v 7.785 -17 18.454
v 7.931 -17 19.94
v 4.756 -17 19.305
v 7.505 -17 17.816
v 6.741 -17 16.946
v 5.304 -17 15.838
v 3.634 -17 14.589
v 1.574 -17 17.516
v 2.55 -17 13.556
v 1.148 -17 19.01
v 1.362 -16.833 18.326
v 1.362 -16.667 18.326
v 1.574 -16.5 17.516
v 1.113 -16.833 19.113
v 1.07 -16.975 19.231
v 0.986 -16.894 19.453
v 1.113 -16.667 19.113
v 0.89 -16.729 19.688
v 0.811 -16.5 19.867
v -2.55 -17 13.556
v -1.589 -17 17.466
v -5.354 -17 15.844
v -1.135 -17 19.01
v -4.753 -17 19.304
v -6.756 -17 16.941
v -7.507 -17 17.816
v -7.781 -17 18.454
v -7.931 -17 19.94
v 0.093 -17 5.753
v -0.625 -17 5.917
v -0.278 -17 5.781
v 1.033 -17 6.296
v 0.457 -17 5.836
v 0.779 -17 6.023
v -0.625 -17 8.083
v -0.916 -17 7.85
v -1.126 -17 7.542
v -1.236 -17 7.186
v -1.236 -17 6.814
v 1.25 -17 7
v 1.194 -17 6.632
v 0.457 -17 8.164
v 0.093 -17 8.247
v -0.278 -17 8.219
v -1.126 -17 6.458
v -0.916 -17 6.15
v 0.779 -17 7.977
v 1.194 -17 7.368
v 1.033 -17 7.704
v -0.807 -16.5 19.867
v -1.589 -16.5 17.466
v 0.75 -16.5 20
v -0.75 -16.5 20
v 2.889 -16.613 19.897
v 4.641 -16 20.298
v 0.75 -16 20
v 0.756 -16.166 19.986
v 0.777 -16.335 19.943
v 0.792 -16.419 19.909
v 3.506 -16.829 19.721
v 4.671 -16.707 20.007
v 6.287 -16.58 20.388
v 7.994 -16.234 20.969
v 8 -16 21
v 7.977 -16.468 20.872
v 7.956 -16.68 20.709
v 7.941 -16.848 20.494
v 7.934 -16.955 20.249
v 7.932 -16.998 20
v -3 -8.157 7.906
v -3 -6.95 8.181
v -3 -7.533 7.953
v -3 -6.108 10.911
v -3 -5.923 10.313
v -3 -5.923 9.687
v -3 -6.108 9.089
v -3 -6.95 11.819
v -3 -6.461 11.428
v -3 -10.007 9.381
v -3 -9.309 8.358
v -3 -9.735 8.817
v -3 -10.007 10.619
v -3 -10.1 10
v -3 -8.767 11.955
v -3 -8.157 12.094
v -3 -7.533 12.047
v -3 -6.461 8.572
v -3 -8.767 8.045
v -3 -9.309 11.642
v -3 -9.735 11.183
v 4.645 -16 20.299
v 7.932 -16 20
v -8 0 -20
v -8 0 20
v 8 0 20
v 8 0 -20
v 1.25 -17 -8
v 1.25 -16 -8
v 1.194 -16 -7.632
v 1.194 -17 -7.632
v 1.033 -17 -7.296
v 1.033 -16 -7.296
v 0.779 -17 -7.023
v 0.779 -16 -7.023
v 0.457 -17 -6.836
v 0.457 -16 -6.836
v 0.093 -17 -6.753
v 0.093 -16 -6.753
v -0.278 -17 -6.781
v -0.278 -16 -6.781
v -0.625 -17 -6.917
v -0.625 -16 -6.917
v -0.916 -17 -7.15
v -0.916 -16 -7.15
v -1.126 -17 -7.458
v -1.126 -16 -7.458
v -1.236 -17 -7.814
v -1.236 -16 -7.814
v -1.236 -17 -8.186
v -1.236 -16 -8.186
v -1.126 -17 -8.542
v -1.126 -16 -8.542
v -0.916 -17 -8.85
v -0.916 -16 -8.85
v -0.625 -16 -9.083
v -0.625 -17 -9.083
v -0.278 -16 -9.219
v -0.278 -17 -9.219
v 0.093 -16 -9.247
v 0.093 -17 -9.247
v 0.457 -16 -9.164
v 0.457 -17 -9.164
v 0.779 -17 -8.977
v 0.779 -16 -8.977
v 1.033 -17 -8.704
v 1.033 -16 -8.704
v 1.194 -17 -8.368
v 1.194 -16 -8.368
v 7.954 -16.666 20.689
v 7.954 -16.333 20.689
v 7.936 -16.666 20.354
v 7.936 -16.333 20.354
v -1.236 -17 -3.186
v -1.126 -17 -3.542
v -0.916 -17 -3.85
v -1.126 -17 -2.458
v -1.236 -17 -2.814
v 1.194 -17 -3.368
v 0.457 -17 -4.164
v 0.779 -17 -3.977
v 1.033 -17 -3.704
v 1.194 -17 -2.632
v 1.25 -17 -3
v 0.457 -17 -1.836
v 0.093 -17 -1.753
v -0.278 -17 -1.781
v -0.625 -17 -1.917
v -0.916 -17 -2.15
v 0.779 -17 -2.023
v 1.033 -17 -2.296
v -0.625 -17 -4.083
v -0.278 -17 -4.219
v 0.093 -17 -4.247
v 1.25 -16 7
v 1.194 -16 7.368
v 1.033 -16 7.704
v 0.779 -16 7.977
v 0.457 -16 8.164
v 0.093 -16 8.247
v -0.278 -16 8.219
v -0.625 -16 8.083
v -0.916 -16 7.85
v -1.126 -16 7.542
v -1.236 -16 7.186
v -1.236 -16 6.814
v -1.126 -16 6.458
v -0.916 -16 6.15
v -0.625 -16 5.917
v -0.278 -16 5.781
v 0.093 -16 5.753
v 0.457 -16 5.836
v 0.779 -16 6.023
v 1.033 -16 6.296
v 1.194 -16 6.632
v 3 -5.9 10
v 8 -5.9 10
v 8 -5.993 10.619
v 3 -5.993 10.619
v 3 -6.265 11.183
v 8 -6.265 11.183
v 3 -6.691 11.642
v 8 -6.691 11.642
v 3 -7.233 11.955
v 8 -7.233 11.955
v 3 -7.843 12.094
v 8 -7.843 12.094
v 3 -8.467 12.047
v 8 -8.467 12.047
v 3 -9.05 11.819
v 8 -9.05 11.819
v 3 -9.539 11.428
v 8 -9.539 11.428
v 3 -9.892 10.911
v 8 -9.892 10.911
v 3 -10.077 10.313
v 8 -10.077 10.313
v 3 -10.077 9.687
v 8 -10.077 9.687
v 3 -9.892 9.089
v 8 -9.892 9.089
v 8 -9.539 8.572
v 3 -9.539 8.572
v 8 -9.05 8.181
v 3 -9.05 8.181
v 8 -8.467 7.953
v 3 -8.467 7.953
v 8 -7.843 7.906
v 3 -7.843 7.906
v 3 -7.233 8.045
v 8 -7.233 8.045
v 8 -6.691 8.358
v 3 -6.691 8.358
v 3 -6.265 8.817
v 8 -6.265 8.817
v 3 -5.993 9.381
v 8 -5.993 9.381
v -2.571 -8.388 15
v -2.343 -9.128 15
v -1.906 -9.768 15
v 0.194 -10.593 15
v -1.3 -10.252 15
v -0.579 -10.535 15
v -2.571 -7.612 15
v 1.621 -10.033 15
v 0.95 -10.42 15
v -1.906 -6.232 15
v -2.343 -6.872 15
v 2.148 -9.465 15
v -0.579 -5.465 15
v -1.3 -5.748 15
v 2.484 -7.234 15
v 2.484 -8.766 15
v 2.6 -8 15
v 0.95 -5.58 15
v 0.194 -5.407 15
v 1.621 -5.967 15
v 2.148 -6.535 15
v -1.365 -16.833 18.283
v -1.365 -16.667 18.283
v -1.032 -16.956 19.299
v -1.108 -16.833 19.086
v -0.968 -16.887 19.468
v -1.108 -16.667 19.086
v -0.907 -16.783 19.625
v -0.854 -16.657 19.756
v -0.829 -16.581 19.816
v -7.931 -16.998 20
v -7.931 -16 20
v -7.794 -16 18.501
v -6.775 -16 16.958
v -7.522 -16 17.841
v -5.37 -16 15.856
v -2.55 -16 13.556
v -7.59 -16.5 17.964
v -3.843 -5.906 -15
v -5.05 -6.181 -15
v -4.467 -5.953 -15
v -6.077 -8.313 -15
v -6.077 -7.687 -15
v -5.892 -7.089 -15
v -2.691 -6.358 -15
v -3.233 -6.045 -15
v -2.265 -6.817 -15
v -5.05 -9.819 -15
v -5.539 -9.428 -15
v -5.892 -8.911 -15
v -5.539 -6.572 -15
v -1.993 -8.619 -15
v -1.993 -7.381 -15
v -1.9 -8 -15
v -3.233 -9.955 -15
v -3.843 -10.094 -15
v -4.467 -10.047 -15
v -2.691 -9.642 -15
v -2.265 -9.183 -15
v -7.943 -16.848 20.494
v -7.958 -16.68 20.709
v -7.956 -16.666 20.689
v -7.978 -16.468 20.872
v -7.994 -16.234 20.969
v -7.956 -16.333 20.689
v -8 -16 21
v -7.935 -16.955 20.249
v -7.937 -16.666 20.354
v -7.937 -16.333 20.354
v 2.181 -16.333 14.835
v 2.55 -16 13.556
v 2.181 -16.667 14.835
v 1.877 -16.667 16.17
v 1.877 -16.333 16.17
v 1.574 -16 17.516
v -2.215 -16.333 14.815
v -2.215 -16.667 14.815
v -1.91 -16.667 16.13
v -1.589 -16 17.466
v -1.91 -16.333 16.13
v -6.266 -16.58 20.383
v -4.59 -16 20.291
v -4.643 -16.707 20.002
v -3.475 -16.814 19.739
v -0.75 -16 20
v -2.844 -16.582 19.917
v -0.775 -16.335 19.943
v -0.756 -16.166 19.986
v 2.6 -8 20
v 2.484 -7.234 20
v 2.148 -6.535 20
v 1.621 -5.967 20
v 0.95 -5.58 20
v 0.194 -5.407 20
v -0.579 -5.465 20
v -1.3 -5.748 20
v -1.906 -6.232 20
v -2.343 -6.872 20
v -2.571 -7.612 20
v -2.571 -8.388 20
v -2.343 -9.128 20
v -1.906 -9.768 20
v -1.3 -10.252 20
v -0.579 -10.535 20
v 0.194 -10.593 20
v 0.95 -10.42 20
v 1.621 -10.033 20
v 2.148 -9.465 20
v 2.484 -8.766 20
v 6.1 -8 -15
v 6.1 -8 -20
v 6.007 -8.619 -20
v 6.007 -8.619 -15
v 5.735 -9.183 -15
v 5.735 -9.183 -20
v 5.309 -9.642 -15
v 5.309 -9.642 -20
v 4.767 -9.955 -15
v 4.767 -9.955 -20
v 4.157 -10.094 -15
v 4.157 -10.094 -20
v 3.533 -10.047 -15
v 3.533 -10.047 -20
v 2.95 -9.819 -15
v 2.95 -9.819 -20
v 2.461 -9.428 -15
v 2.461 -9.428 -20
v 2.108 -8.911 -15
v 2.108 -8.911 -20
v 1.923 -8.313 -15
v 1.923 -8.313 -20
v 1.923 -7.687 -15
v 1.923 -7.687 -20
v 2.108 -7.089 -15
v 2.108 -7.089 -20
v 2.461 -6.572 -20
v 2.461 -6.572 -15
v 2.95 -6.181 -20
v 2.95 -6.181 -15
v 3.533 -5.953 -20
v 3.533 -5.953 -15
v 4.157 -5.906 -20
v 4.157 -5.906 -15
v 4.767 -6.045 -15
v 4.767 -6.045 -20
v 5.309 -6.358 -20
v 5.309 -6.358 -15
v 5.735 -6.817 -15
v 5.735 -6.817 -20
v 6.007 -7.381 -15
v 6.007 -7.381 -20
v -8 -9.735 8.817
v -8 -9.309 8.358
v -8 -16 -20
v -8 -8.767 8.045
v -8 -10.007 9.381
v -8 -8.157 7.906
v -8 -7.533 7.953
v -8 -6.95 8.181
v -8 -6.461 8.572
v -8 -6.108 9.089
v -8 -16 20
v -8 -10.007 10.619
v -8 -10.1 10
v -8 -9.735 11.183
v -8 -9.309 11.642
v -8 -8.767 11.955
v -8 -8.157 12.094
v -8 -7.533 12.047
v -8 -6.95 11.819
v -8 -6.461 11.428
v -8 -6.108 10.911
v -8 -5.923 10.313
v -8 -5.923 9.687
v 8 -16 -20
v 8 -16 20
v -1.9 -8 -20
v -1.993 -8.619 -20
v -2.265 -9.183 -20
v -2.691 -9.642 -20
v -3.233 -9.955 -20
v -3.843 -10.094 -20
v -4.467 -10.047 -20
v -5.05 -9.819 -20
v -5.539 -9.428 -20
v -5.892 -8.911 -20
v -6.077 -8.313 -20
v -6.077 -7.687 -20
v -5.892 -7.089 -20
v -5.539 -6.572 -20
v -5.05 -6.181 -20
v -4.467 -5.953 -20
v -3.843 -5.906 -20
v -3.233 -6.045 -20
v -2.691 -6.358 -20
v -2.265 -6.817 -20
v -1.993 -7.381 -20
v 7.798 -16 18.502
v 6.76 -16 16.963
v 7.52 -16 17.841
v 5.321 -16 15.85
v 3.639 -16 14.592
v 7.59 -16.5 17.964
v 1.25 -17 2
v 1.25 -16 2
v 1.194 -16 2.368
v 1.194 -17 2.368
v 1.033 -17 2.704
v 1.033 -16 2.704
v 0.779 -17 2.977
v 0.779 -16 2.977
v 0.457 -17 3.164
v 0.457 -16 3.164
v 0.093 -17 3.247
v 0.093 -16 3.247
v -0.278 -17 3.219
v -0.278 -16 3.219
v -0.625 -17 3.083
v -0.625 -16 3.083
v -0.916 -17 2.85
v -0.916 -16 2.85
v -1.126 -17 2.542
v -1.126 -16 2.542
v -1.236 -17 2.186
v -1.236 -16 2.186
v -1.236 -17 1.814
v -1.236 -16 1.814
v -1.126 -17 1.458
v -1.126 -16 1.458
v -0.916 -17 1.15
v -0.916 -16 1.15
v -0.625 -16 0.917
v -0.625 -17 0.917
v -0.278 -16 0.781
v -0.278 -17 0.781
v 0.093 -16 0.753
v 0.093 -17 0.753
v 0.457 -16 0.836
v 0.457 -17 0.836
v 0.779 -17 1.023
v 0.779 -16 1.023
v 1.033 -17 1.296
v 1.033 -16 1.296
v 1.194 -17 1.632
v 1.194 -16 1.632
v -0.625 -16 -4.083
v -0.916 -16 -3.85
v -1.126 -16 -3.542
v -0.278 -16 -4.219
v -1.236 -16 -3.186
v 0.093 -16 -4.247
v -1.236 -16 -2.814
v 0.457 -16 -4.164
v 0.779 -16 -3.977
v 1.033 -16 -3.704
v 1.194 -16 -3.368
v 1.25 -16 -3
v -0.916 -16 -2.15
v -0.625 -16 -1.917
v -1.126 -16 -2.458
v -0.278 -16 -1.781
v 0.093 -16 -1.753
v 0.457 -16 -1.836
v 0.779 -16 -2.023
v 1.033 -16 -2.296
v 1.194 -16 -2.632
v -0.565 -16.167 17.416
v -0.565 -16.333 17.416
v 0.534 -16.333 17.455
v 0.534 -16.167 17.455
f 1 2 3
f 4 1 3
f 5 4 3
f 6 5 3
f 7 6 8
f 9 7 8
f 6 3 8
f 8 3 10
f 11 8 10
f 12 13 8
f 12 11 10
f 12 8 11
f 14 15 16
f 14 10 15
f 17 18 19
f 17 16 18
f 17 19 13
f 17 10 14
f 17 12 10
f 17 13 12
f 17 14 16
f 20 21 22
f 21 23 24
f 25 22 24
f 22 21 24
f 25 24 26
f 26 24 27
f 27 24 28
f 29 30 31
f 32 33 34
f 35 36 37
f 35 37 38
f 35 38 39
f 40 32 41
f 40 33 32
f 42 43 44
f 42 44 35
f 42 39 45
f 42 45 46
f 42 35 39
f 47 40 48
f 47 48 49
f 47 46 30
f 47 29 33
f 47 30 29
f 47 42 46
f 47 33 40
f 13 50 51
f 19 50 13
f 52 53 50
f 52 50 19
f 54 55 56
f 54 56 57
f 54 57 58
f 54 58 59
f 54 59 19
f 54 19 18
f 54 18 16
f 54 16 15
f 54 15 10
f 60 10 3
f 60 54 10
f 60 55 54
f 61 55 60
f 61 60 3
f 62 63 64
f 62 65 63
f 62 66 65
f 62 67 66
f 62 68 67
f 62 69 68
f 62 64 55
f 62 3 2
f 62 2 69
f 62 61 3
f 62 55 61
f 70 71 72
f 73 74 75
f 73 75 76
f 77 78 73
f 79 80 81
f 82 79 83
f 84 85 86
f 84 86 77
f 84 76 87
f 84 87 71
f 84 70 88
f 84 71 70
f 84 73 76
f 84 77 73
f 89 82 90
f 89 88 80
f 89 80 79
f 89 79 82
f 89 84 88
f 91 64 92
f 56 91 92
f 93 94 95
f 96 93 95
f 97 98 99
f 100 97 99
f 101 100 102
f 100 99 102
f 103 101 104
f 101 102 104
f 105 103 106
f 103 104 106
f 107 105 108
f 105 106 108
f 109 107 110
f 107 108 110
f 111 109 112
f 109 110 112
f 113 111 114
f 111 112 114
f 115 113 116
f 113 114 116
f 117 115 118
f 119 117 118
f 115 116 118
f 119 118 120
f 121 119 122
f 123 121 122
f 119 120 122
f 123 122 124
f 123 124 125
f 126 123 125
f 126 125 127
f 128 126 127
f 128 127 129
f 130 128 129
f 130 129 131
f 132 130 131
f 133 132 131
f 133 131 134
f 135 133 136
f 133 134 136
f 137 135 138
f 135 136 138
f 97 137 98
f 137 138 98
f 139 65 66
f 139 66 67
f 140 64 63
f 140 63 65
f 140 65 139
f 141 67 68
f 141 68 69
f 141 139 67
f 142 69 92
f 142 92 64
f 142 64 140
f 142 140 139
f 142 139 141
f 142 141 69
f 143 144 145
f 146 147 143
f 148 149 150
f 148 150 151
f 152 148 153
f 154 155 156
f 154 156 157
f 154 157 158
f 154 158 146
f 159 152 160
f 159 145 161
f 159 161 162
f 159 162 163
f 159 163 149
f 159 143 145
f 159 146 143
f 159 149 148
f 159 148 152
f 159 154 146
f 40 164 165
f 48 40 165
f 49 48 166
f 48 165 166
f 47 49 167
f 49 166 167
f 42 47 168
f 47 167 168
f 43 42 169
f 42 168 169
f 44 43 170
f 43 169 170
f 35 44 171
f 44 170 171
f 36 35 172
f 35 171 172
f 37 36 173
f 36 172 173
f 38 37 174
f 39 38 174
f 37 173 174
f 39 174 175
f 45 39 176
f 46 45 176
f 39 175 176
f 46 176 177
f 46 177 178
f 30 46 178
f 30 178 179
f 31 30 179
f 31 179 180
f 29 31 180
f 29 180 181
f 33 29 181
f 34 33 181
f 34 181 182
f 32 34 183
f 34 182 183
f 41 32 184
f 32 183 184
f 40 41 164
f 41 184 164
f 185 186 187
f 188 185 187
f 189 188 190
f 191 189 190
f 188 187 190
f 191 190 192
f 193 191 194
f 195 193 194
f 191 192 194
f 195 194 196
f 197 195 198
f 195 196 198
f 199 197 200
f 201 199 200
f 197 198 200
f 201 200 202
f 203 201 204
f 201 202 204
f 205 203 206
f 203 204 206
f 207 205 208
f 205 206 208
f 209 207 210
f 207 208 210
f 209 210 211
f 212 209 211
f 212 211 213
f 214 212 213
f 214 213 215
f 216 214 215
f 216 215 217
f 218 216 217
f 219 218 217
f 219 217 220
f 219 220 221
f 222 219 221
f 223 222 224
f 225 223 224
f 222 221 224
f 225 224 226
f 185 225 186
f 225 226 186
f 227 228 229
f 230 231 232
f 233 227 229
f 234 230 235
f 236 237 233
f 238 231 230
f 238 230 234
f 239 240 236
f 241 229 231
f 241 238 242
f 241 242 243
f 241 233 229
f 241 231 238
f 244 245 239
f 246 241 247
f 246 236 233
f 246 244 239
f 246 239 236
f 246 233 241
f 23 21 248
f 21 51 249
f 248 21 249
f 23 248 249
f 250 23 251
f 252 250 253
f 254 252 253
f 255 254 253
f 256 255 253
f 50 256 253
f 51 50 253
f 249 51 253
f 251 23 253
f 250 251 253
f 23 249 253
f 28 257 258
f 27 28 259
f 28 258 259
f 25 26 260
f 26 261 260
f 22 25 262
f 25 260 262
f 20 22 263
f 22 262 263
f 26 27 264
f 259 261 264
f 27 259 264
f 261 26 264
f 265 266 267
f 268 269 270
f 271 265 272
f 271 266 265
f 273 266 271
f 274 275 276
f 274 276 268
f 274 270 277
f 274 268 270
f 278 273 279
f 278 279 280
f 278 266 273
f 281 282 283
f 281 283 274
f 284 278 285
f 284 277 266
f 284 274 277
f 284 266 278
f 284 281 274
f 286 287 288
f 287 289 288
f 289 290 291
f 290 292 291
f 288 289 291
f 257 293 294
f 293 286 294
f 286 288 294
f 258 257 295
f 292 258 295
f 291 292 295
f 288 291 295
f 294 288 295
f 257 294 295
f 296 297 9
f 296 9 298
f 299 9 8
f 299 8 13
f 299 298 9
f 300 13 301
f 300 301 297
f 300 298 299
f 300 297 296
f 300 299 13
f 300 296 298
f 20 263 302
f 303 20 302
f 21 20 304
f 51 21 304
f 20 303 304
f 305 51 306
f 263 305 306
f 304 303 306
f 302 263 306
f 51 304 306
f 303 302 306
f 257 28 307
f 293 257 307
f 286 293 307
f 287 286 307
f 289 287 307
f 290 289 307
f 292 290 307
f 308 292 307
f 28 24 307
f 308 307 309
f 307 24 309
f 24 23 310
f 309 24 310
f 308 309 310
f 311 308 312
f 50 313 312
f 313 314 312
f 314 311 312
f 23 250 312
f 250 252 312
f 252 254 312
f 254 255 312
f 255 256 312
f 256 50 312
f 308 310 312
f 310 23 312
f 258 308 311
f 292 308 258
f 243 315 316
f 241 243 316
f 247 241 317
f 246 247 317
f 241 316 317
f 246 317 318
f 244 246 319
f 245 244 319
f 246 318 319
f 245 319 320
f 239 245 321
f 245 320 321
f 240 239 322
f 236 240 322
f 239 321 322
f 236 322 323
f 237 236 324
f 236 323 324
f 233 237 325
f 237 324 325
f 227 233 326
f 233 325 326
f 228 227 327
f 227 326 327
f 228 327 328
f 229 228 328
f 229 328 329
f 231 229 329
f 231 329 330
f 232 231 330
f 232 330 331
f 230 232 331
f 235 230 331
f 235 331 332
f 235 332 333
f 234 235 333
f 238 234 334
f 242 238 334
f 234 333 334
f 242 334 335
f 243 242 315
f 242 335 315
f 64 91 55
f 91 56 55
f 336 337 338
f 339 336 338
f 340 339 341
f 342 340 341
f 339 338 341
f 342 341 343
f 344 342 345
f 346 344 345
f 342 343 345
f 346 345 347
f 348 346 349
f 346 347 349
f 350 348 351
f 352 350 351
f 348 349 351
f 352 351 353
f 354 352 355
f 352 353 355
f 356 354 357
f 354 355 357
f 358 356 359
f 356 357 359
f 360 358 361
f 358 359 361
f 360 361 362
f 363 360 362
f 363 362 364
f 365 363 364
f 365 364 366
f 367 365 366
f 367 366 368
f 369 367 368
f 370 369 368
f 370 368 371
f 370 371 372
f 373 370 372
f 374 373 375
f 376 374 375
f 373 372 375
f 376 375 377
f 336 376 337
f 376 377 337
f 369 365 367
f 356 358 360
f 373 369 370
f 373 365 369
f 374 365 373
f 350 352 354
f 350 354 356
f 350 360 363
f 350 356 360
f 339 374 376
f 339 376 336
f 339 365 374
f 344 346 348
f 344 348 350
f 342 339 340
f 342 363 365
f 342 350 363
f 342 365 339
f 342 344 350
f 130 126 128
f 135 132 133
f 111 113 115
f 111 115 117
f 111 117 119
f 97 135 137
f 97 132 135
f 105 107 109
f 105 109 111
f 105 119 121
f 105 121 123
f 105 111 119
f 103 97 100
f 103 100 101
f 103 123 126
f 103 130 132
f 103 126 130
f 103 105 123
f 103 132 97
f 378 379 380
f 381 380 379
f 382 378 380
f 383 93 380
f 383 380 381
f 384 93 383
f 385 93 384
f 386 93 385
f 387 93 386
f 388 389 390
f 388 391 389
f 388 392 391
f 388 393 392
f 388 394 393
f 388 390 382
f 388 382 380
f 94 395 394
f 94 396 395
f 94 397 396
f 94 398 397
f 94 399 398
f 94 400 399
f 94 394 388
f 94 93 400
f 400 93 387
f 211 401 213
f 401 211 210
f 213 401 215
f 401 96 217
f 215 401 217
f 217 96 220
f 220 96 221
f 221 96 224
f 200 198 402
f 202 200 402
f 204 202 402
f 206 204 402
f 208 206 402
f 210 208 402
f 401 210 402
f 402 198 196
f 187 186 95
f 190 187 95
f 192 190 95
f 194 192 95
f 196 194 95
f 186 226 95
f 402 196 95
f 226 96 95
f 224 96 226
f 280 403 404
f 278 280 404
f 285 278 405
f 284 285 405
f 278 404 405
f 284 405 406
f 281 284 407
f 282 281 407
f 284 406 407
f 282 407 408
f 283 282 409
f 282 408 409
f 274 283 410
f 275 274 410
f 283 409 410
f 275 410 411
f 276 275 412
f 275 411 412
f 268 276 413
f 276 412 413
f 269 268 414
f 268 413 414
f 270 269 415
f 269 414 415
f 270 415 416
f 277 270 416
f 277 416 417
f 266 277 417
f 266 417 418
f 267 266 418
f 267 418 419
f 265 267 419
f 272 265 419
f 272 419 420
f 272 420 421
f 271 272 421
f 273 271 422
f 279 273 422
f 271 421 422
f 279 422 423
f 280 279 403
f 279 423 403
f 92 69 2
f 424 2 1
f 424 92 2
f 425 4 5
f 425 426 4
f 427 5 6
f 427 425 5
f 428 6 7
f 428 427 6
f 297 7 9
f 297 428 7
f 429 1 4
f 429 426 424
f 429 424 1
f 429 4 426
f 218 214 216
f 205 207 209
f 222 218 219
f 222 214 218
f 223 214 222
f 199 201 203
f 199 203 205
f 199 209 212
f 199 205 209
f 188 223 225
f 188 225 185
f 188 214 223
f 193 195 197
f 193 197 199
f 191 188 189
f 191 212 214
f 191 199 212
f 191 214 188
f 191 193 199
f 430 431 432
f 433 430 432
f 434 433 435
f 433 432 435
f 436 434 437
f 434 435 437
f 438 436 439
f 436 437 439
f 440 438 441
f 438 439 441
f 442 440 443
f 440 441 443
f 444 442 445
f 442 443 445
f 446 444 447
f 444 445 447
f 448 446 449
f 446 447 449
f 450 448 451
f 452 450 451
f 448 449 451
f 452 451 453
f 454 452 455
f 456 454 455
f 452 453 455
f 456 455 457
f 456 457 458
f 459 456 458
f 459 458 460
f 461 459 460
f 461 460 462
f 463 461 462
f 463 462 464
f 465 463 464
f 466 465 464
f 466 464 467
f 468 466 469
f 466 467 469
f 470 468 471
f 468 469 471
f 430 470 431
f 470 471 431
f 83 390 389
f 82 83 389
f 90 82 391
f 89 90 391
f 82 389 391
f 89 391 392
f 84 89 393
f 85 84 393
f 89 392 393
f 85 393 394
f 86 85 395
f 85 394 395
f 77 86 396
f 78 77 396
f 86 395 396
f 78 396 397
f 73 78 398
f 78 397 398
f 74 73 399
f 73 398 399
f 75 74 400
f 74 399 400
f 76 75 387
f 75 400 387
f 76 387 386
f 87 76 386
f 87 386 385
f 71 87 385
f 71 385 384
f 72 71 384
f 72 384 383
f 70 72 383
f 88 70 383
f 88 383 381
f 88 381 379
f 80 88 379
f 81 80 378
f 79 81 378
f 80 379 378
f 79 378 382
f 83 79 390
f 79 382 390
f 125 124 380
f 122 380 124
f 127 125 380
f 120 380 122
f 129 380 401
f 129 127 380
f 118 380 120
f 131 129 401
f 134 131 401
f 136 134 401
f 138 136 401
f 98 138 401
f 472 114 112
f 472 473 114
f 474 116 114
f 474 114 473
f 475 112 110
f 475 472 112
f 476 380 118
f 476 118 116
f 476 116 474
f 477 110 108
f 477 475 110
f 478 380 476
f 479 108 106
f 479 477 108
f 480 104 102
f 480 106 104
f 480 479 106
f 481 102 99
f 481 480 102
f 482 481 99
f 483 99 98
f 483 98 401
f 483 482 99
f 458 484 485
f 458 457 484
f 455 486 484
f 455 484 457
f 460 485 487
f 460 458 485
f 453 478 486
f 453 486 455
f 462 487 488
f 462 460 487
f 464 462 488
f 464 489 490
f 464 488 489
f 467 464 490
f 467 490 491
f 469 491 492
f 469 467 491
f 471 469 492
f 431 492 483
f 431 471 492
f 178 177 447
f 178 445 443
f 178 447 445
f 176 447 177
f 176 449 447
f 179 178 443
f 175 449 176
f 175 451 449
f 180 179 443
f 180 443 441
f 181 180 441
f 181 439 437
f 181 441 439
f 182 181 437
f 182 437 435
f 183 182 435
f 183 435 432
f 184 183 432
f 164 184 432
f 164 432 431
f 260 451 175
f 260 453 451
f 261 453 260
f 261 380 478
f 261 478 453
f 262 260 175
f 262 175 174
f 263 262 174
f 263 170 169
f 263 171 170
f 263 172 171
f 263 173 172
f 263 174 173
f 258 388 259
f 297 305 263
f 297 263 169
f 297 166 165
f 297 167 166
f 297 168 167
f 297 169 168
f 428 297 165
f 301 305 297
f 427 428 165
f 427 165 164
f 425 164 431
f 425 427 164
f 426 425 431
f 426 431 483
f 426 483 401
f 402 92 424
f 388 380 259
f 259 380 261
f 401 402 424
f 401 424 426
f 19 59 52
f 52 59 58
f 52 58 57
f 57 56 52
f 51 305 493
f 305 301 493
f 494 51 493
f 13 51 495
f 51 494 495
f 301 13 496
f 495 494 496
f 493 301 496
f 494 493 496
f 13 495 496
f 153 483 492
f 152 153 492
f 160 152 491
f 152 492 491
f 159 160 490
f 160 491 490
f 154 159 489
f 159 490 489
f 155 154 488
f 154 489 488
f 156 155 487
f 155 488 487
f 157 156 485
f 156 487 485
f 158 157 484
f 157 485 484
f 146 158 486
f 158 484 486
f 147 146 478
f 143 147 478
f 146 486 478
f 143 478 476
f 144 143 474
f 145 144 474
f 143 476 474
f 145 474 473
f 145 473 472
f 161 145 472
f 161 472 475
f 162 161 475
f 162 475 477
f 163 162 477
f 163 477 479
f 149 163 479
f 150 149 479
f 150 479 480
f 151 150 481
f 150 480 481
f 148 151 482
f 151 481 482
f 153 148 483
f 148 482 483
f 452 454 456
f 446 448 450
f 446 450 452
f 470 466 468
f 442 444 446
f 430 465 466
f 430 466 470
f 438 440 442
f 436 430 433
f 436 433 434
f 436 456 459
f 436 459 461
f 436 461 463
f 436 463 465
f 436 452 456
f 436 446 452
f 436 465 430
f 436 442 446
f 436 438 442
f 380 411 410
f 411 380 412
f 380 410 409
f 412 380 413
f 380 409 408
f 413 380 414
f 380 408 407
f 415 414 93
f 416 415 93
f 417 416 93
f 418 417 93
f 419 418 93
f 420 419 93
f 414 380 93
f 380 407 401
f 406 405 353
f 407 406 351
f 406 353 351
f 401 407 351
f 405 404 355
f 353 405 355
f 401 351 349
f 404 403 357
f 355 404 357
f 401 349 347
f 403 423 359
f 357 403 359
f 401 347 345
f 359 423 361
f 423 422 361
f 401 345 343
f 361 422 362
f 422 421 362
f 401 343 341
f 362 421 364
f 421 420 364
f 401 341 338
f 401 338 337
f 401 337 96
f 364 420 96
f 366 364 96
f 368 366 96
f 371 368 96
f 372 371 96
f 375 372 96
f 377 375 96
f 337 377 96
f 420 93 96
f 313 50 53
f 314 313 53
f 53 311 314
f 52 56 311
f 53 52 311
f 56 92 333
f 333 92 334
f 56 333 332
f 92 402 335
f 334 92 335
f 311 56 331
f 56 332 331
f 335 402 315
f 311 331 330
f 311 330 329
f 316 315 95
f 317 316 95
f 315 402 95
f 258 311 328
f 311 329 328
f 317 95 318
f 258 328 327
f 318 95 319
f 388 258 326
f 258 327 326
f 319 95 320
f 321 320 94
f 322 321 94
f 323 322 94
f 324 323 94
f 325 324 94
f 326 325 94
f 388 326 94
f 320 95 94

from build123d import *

# Parameters (mm, degrees)
F0_W      = 16
F0_H      = 40
F1_DEPTH  = 16
F2_R      = 2.6
F3_DEPTH  = 5
F4_R      = 2.1
F5_DEPTH  = 5
F6_R      = 2.1
F7_DEPTH  = 5
F8_R      = 2.1
F9_DEPTH  = 5
F10_R     = 2.1
F11_DEPTH = 5
F12_R     = 1.25
F13_DEPTH = 1
F14_R     = 1.25
F15_DEPTH = 1
F16_R     = 1.25
F17_DEPTH = 1
F18_R     = 1.25
F19_DEPTH = 1
F21_DEPTH = 1
F22_R     = 0.9999
F23_DEPTH = 0.5


# Not quite as in the source:
# - a fillet or chamfer is up to 0.001 mm smaller than in the source, because OpenCascade refuses the exact size


with BuildPart() as f1:
    # F0 (on Front) → F1 (new body)
    with BuildSketch(Plane.XZ):
        Rectangle(F0_W, F0_H)
    extrude(amount=F1_DEPTH)

    # F2 (on face) → F3 (cut)
    with BuildSketch(Plane.XY.offset(20)):
        with Locations((0, -8)):
            Circle(F2_R)
    extrude(amount=-F3_DEPTH, mode=Mode.SUBTRACT)

    # F4 (on face) → F5 (cut)
    with BuildSketch(Plane.YZ.offset(8)):
        with Locations((-8, 10)):
            Circle(F4_R)
    extrude(amount=-F5_DEPTH, mode=Mode.SUBTRACT)

    # F6 (on face) → F7 (cut)
    with BuildSketch(Plane(origin=(-8, 0, 0), x_dir=(0, -1, 0), z_dir=(-1, 0, 0))):
        with Locations((8, 10)):
            Circle(F6_R)
    extrude(amount=-F7_DEPTH, mode=Mode.SUBTRACT)

    # F8 (on face) → F9 (cut)
    with BuildSketch(Plane(origin=(0, 0, -20), x_dir=(1, 0, 0), z_dir=(0, 0, -1))):
        with Locations((4, 8)):
            Circle(F8_R)
    extrude(amount=-F9_DEPTH, mode=Mode.SUBTRACT)

    # F10 (on face) → F11 (cut)
    with BuildSketch(Plane(origin=(0, 0, -20), x_dir=(1, 0, 0), z_dir=(0, 0, -1))):
        with Locations((-4, 8)):
            Circle(F10_R)
    extrude(amount=-F11_DEPTH, mode=Mode.SUBTRACT)

    # F12 (on face) → F13 (join)
    with BuildSketch(Plane.XZ.offset(16)):
        with Locations((0, 7)):
            Circle(F12_R)
    extrude(amount=F13_DEPTH)

    # F14 (on face) → F15 (join)
    with BuildSketch(Plane.XZ.offset(16)):
        with Locations((0, 2)):
            Circle(F14_R)
    extrude(amount=F15_DEPTH)

    # F16 (on face) → F17 (join)
    with BuildSketch(Plane.XZ.offset(16)):
        with Locations((0, -3)):
            Circle(F16_R)
    extrude(amount=F17_DEPTH)

    # F18 (on face) → F19 (join)
    with BuildSketch(Plane.XZ.offset(16)):
        with Locations((0, -8)):
            Circle(F18_R)
    extrude(amount=F19_DEPTH)

    # F20 (on face) → F21 (join)
    with BuildSketch(Plane.XZ.offset(16)):
        with BuildLine():
            add(Edge.make_bspline(
                [(0.75, 20), (3.3594071533, 20.0532824127), (5.9301231166, 20.3851114773), (8, 21)],
                knots=[8.72055047, 8.72055047, 8.72055047, 8.72055047, 16, 16, 16, 16], degree=3))
            Line((0.75, 20), (7.9315101276, 20))
            add(Edge.make_bspline(
                [(8, 21), (7.936682093, 20.7032053334), (7.9331222274, 20.3617292136), (7.9315101276, 20)],
                knots=[0, 0, 0, 0, 0.1427572475, 0.1427572475, 0.1427572475, 0.1427572475], degree=3))
        make_face()
        with BuildLine():
            add(Edge.make_bspline(
                [(-8, 21), (-5.9479143878, 20.3884393869), (-3.3741827757, 20.0535723375), (-0.75, 20)],
                knots=[0, 0, 0, 0, 7.3266434187, 7.3266434187, 7.3266434187, 7.3266434187], degree=3))
            add(Edge.make_bspline(
                [(-8, 21), (-7.9392027192, 20.7034220667), (-7.9347343847, 20.3618566303), (-7.9314905291, 20)],
                knots=[0, 0, 0, 0, 0.1427309242, 0.1427309242, 0.1427309242, 0.1427309242], degree=3))
            Line((-7.9314905291, 20), (-0.75, 20))
        make_face()
        with BuildLine():
            Line((7.9315101276, 20), (0.75, 20))
            add(Edge.make_bspline(
                [(1.5735535475, 17.5164310059), (1.3638279631, 18.3834931797), (1.1151249806, 19.2296253371), (0.75, 20)],
                knots=[4.0589797926, 4.0589797926, 4.0589797926, 4.0589797926, 6.690552617, 6.690552617, 6.690552617, 6.690552617], degree=3))
            add(Edge.make_bspline(
                [(2.55, 13.5561273817), (2.1277926475, 14.7918965335), (1.8970376255, 16.1790605143), (1.5735535475, 17.5164310059)],
                knots=[0, 0, 0, 0, 4.0589797926, 4.0589797926, 4.0589797926, 4.0589797926], degree=3))
            add(Edge.make_bspline(
                [(7.9315101276, 20), (7.9285658859, 19.3393596044), (7.9402465057, 16.9450971177), (4.2150295862, 15.4292771095), (2.55, 13.5561273817)],
                knots=[0.1427572475, 0.1427572475, 0.1427572475, 0.1427572475, 0.4034804652, 1, 1, 1, 1], degree=3))
        make_face()
        with BuildLine():
            add(Edge.make_bspline(
                [(-1.5894267657, 17.4658260078), (-1.3661758267, 18.3343166755), (-1.104863981, 19.193579629), (-0.75, 20)],
                knots=[4.0525124649, 4.0525124649, 4.0525124649, 4.0525124649, 6.690552617, 6.690552617, 6.690552617, 6.690552617], degree=3))
            Line((-0.75, 20), (-7.9314905291, 20))
            add(Edge.make_bspline(
                [(-7.9314905291, 20), (-7.9255644562, 19.3389382799), (-7.9195168056, 16.9429139448), (-4.3261046571, 15.4424536286), (-2.55, 13.5561273817)],
                knots=[0.1427309242, 0.1427309242, 0.1427309242, 0.1427309242, 0.4034804652, 1, 1, 1, 1], degree=3))
            add(Edge.make_bspline(
                [(-2.55, 13.5561273817), (-2.185517021, 14.7757286924), (-1.9323810655, 16.1316653987), (-1.5894267657, 17.4658260078)],
                knots=[0, 0, 0, 0, 4.0525124649, 4.0525124649, 4.0525124649, 4.0525124649], degree=3))
        make_face()
    extrude(amount=F21_DEPTH)

    # F22 (radius 1 in the source; OpenCascade refuses exactly that, so slightly less here)
    f22_edges = [f1.edges().sort_by_distance(p)[0] for p in [
        (4.408175, -17, 20.266958),
        (-4.589536, -17, 20.290754),
    ]]
    fillet(f22_edges, radius=F22_R)

    # F20 (on face) → F23 (join)
    with BuildSketch(Plane.XZ.offset(16)):
        with BuildLine():
            Line((0.75, 20), (-0.75, 20))
            add(Edge.make_bspline(
                [(-0.75, 20), (-0.2507445203, 19.9898077667), (0.2503370769, 19.9897972051), (0.75, 20)],
                knots=[7.3266434187, 7.3266434187, 7.3266434187, 7.3266434187, 8.72055047, 8.72055047, 8.72055047, 8.72055047], degree=3))
        make_face()
        with BuildLine():
            add(Edge.make_bspline(
                [(-0.75, 20), (-0.2507445203, 19.9898077667), (0.2503370769, 19.9897972051), (0.75, 20)],
                knots=[7.3266434187, 7.3266434187, 7.3266434187, 7.3266434187, 8.72055047, 8.72055047, 8.72055047, 8.72055047], degree=3))
            add(Edge.make_bspline(
                [(-1.5894267657, 17.4658260078), (-1.3661758267, 18.3343166755), (-1.104863981, 19.193579629), (-0.75, 20)],
                knots=[4.0525124649, 4.0525124649, 4.0525124649, 4.0525124649, 6.690552617, 6.690552617, 6.690552617, 6.690552617], degree=3))
            add(Edge.make_bspline(
                [(-1.5894267657, 17.4658260078), (-0.646941675, 17.3500761834), (0.6084956384, 17.4665004575), (1.5735535475, 17.5164310059)],
                knots=[0, 0, 0, 0, 3.1633851058, 3.1633851058, 3.1633851058, 3.1633851058], degree=3))
            add(Edge.make_bspline(
                [(1.5735535475, 17.5164310059), (1.3638279631, 18.3834931797), (1.1151249806, 19.2296253371), (0.75, 20)],
                knots=[4.0589797926, 4.0589797926, 4.0589797926, 4.0589797926, 6.690552617, 6.690552617, 6.690552617, 6.690552617], degree=3))
        make_face()
    extrude(amount=F23_DEPTH)


solid = f1.part
